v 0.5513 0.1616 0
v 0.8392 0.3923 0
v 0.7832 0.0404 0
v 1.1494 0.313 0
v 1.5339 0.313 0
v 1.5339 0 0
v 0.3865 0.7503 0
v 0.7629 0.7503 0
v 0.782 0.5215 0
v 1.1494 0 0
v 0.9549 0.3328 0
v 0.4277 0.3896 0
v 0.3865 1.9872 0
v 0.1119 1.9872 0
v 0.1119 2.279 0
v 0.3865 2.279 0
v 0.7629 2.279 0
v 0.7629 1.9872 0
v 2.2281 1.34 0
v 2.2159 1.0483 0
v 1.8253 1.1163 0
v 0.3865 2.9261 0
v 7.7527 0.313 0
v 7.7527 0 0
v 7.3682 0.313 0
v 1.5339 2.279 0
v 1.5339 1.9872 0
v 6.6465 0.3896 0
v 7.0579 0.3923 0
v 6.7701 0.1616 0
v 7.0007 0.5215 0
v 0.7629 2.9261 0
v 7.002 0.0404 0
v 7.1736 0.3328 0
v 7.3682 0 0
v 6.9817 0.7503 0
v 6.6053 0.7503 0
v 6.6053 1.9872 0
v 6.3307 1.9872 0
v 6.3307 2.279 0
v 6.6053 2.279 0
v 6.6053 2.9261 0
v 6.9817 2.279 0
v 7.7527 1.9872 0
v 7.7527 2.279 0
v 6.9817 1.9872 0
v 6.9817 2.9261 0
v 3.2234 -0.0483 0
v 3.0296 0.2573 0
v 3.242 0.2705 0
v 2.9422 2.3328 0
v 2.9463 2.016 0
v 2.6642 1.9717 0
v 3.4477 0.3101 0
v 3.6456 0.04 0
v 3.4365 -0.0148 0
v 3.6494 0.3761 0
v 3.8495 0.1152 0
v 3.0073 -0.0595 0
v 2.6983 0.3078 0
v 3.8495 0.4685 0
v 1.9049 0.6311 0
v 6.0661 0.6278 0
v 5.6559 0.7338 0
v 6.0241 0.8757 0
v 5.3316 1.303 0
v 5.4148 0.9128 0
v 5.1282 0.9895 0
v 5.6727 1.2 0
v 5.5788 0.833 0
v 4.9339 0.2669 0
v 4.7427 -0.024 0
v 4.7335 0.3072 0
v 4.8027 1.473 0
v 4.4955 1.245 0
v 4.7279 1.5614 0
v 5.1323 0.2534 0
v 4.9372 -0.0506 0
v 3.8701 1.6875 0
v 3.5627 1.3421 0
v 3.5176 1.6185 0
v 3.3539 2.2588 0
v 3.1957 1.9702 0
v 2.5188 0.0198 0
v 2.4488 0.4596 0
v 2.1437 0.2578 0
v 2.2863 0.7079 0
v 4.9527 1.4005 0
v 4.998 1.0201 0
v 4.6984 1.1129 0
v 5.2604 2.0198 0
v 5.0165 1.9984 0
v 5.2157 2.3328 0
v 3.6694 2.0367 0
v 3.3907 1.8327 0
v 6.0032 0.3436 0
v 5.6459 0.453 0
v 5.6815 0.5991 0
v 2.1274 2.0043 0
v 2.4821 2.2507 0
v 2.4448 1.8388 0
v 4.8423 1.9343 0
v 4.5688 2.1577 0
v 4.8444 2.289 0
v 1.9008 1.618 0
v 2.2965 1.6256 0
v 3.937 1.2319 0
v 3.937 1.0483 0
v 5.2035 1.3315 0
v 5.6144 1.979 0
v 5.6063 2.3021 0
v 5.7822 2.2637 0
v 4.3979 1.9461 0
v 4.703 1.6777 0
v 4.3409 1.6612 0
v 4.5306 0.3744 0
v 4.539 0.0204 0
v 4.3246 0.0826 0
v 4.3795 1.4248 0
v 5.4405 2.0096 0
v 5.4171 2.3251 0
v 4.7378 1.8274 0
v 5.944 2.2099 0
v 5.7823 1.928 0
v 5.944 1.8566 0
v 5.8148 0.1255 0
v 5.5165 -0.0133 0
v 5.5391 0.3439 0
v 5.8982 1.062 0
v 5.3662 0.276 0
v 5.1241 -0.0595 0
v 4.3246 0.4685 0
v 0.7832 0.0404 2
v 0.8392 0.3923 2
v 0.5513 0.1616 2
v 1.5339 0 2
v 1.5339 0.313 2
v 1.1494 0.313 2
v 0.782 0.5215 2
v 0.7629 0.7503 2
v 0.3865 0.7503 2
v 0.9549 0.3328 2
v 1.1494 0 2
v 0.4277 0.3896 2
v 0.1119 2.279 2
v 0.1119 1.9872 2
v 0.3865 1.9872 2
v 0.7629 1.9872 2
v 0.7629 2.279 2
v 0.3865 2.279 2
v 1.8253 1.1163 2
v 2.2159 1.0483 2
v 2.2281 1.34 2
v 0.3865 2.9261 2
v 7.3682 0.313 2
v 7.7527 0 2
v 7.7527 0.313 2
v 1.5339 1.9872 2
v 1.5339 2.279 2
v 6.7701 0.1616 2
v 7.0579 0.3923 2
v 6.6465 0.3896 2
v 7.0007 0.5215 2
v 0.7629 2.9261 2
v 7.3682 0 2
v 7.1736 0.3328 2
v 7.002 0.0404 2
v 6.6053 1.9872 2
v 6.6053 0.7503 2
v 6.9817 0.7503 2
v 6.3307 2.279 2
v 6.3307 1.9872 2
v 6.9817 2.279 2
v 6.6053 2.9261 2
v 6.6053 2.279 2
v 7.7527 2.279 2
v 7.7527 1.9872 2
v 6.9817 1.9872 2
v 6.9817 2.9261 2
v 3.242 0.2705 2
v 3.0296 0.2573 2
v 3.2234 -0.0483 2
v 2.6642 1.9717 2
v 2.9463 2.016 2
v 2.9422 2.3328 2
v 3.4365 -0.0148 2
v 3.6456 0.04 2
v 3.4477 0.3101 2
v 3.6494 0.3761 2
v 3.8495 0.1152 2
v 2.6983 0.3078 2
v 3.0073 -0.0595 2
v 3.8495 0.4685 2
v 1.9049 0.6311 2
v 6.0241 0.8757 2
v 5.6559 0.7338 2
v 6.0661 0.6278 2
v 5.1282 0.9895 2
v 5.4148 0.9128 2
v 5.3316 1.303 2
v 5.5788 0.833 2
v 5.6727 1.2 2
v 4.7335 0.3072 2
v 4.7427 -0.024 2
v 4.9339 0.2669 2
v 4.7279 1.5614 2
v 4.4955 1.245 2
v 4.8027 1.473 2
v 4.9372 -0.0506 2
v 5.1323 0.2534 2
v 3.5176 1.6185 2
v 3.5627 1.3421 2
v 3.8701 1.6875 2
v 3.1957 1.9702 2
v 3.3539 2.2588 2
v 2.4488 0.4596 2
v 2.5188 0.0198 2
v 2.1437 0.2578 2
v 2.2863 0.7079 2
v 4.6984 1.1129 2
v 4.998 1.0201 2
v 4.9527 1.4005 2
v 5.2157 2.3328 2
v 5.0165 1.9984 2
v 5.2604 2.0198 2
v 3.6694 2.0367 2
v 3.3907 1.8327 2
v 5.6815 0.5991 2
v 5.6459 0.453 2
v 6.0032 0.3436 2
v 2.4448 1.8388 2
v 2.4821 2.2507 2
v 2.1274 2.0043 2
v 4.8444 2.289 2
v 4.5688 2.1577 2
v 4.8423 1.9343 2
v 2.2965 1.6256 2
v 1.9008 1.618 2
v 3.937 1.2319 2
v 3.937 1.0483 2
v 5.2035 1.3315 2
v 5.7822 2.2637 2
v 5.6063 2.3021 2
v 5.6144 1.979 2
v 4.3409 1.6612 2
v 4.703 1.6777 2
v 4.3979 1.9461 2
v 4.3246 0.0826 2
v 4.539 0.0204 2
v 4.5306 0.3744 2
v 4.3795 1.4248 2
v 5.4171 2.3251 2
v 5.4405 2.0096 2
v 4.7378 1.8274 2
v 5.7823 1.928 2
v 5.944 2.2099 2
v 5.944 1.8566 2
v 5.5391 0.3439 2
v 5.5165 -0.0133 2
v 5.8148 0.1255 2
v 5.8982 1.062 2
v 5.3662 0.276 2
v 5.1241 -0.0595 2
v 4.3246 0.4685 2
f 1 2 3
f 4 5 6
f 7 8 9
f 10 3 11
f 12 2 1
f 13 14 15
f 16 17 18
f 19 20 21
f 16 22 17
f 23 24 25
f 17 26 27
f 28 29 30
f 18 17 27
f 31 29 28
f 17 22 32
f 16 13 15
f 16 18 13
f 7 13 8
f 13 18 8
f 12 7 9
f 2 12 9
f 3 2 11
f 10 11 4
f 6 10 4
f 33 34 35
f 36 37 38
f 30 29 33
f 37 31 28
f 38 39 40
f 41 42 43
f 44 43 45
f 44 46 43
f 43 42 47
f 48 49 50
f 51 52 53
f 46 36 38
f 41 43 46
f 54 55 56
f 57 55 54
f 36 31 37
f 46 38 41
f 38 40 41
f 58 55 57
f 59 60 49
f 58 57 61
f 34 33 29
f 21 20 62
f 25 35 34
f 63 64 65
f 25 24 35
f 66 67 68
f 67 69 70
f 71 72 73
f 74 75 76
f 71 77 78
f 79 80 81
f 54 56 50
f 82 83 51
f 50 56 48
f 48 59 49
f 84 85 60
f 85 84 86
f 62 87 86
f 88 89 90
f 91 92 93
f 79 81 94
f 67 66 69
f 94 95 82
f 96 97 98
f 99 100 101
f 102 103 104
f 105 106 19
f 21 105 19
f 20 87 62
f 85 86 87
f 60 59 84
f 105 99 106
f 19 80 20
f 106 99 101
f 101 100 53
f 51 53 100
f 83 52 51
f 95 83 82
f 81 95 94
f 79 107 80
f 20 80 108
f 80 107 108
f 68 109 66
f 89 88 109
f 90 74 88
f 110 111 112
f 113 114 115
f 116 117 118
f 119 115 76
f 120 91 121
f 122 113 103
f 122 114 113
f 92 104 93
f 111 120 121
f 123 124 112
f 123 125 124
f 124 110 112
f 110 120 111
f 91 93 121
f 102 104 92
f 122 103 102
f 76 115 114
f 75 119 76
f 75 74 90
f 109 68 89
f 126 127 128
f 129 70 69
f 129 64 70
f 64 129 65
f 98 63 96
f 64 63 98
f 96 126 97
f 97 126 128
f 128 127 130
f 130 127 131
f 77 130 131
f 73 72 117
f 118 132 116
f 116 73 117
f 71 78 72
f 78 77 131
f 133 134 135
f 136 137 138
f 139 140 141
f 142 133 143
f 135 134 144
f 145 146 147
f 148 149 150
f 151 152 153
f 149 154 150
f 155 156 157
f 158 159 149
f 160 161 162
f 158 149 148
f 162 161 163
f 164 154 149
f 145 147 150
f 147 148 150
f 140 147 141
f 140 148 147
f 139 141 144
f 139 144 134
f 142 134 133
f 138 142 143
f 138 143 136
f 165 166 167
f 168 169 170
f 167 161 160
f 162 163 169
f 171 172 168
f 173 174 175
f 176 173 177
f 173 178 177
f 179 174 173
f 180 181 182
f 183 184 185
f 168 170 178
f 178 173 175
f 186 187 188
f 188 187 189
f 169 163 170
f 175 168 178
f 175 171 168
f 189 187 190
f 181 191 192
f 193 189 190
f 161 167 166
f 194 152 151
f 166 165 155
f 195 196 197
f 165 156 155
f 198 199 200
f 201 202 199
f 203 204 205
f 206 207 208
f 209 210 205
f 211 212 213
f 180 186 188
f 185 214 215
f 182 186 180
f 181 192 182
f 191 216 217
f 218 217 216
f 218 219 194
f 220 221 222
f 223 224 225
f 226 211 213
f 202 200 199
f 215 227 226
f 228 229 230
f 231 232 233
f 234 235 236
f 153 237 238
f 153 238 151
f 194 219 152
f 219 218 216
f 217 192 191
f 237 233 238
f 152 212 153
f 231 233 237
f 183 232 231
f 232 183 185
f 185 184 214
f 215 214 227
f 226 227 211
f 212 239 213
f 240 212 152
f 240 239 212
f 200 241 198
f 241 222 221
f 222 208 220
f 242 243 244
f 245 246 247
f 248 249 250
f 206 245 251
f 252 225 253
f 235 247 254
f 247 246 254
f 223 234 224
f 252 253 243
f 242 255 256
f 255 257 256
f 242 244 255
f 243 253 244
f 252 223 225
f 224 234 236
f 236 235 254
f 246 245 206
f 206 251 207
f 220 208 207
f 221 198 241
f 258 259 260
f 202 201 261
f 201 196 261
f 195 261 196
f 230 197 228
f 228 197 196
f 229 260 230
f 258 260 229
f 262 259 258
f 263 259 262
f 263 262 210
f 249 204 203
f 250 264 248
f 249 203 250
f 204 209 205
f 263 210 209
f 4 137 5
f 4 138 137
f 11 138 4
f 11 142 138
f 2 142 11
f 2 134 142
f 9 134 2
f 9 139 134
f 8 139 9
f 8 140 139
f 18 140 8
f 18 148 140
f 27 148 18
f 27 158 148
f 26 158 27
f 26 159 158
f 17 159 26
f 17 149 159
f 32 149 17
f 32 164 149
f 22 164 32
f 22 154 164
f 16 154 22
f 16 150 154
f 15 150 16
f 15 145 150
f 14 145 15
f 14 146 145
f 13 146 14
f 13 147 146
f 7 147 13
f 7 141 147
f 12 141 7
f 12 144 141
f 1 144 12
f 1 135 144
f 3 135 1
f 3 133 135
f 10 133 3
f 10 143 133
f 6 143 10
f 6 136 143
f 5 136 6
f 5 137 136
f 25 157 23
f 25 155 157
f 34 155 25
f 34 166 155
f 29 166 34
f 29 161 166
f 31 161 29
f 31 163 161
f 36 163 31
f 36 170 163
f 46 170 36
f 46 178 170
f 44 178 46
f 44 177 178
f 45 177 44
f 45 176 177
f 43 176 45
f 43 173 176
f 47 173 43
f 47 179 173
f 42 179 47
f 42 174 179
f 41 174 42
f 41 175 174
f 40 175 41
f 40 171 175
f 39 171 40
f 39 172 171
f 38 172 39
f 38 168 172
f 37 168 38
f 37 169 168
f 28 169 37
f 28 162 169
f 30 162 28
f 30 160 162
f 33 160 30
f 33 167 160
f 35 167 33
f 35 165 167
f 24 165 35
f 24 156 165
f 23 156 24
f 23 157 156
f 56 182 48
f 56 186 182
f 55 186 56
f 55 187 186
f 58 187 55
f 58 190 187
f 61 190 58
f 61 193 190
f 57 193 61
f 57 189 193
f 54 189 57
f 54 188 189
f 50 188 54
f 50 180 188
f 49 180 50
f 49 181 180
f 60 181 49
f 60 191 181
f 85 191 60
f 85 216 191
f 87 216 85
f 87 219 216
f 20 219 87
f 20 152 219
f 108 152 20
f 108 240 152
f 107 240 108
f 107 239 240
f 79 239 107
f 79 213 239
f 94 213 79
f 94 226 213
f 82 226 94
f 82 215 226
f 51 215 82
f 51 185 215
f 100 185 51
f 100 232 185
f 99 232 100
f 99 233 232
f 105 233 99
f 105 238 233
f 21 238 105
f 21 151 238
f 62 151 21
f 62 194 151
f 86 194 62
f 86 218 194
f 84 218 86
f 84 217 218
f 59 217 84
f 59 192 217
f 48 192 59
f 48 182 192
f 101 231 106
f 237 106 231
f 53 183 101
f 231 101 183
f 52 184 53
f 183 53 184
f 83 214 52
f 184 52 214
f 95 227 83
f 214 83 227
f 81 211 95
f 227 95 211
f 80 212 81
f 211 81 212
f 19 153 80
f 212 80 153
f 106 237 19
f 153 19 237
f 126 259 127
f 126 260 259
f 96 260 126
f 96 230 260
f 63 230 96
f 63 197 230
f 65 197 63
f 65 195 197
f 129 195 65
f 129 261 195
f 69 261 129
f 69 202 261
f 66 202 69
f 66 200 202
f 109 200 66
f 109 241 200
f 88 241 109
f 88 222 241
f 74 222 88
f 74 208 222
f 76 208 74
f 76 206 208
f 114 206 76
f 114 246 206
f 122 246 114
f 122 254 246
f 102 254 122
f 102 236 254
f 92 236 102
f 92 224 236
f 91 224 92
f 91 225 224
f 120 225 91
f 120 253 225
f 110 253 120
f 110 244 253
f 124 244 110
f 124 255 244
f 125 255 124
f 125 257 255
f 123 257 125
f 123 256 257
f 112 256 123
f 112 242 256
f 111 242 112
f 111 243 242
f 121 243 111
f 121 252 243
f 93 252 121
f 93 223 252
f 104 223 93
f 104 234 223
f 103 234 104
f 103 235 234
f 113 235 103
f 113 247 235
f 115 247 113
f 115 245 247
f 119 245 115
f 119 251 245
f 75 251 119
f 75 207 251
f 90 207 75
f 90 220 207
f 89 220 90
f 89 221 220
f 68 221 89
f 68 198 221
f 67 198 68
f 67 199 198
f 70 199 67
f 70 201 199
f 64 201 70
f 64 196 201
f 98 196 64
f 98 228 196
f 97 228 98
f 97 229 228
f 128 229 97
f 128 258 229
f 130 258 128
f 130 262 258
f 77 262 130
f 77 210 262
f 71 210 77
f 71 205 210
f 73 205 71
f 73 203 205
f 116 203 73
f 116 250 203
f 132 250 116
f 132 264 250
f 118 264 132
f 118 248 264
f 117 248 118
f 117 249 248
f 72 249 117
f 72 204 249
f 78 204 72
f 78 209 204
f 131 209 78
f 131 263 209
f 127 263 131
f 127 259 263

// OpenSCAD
texte_a_inserer = "test"; 
taille = 3; 
police = "Griffy"; //[[Abril Fatface,Aclonica,Acme,Advent Pro,Akronim,Aladin,Alegreya,Alegreya Sans,Alegreya SC,Alex Brush,Alfa Slab One,Alice,Amaranth,Architects Daughter,Archivo Black,Archivo Narrow,Arimo,Arvo,Asap,Astloch,Asul,Averia Libre,Averia Serif Libre,Bangers,Basic,Belgrano,Berkshire Swash,Bigshot One,Bilbo Swash Caps,Black Ops One,Bonbon,Bowlby One SC,Brawler,Bubblegum Sans,Butterfly Kids,Cabin Condensed,Caesar Dressing,Cagliostro,Calligraffitti,Capriola,Carter One,Changa One,Chango,Chelsea Market,Cherry Cream Soda,Chewy,Chicle,Chivo,Clicker Script,Coming Soon,Concert One,Condiment,Cookie,Courgette,Covered By Your Grace,Crimson Text,Dancing Script,DejaVu Sans,DejaVu Serif,Dhurjati,Doppio One,Dosis,Droid Sans,Eagle Lake,Electrolize,Emilys Candy,Encode Sans,Encode Sans Compressed,Euphoria Script,Exo,Exo 2,Faster One,Federo,Finger Paint,Fjord One,Fontdiner Swanky,Freckle Face,Fruktur,Gabriela,Geo,Germania One,Give You Glory,Gloria Hallelujah,Goudy Bookletter 1911,Graduate,Grand Hotel,Great Vibes,Griffy,Hanalei Fill,Happy Monkey,Henny Penny,Hind,IM Fell English SC,Indie Flower,Irish Grover,Italianno,Jacques Francois Shadow,Jolly Lodger,Josefin Slab,Joti One,Judson,Just Another Hand,Kalam,Kameron,Karma,Kavoon,Knewave,Kranky,Kristi,Laila,Lakki Reddy,Lancelot,Lato,Leckerli One,Ledger,Lekton,Lemon One,Liberation Sans,Libre Caslon Text,Life Savers,Lilita One,Lily Script One,Limelight,Lobster,Lobster Two,Londrina Outline,Londrina Shadow,Londrina Solid,Lora,Love Ya Like A Sister,Loved by the King,Lovers Quarrel,Luckiest Guy,Lusitana,Macondo,Macondo Swash Caps,Mako,Marck Script,Margarine,Marko One,Maven Pro,McLaren,MedievalSharp,Merienda One,Merriweather,Mervale Script,Metal Mania,Metrophobic,Milonga,Miltonian Tattoo,Miss Fajardose,Molle,Montez,Montserrat,Mr De Haviland,Mystery Quest,Neucha,New Rocker,Niconne,Nosifer,Nothing You Could Do,Noto Sans Oriya,Noto Serif,Nova Square,Nunito,Old Standard TT,Oleo Script,Oleo Script Swash Caps,Orbitron,Oregano,Orienta,Original Surfer,Oswald,Over the Rainbow,Overlock,Oxygen,Pacifico,Paprika,Parisienne,Patrick Hand SC,Paytone One,Peralta,Permanent Marker,Piedra,Pirata One,Play,Playball,Poetsen One,Poppins,Press Start 2P,Princess Sofia,PT Mono,Qwigley,Racing Sans One,Raleway,Rancho,Ranga,Ribeye,Roboto,Roboto Condensed,Roboto Slab,Rochester,Rock Salt,Rubik One,Sail,Salsa,Sansita One,Sarina,Satisfy,Schoolbell,Seaweed Script,Sevillana,Shadows Into Light,Shadows Into Light Two,Share,Six Caps,Skranji,Source Sans Pro,Spicy Rice,Stardos Stencil,Stoke,Syncopate,Teko,Terminal Dosis,The Girl Next Door,Tillana,Timmana,Titillium Web,Ubuntu,Ultra,Underdog,UnifrakturCook,UnifrakturMaguntia,Vampiro One,Vidaloka,Viga,Voces,Volkhov,Vollkorn,Voltaire,Waiting for the Sunrise,Wallpoet,Wellfleet,Wendy One,Yellowtail,Yesteryear,Zeyada]]
hauteur = 2; 
module rendu(){
linear_extrude(hauteur) text(texte_a_inserer,size = taille, font = police);
}
rendu();
 
